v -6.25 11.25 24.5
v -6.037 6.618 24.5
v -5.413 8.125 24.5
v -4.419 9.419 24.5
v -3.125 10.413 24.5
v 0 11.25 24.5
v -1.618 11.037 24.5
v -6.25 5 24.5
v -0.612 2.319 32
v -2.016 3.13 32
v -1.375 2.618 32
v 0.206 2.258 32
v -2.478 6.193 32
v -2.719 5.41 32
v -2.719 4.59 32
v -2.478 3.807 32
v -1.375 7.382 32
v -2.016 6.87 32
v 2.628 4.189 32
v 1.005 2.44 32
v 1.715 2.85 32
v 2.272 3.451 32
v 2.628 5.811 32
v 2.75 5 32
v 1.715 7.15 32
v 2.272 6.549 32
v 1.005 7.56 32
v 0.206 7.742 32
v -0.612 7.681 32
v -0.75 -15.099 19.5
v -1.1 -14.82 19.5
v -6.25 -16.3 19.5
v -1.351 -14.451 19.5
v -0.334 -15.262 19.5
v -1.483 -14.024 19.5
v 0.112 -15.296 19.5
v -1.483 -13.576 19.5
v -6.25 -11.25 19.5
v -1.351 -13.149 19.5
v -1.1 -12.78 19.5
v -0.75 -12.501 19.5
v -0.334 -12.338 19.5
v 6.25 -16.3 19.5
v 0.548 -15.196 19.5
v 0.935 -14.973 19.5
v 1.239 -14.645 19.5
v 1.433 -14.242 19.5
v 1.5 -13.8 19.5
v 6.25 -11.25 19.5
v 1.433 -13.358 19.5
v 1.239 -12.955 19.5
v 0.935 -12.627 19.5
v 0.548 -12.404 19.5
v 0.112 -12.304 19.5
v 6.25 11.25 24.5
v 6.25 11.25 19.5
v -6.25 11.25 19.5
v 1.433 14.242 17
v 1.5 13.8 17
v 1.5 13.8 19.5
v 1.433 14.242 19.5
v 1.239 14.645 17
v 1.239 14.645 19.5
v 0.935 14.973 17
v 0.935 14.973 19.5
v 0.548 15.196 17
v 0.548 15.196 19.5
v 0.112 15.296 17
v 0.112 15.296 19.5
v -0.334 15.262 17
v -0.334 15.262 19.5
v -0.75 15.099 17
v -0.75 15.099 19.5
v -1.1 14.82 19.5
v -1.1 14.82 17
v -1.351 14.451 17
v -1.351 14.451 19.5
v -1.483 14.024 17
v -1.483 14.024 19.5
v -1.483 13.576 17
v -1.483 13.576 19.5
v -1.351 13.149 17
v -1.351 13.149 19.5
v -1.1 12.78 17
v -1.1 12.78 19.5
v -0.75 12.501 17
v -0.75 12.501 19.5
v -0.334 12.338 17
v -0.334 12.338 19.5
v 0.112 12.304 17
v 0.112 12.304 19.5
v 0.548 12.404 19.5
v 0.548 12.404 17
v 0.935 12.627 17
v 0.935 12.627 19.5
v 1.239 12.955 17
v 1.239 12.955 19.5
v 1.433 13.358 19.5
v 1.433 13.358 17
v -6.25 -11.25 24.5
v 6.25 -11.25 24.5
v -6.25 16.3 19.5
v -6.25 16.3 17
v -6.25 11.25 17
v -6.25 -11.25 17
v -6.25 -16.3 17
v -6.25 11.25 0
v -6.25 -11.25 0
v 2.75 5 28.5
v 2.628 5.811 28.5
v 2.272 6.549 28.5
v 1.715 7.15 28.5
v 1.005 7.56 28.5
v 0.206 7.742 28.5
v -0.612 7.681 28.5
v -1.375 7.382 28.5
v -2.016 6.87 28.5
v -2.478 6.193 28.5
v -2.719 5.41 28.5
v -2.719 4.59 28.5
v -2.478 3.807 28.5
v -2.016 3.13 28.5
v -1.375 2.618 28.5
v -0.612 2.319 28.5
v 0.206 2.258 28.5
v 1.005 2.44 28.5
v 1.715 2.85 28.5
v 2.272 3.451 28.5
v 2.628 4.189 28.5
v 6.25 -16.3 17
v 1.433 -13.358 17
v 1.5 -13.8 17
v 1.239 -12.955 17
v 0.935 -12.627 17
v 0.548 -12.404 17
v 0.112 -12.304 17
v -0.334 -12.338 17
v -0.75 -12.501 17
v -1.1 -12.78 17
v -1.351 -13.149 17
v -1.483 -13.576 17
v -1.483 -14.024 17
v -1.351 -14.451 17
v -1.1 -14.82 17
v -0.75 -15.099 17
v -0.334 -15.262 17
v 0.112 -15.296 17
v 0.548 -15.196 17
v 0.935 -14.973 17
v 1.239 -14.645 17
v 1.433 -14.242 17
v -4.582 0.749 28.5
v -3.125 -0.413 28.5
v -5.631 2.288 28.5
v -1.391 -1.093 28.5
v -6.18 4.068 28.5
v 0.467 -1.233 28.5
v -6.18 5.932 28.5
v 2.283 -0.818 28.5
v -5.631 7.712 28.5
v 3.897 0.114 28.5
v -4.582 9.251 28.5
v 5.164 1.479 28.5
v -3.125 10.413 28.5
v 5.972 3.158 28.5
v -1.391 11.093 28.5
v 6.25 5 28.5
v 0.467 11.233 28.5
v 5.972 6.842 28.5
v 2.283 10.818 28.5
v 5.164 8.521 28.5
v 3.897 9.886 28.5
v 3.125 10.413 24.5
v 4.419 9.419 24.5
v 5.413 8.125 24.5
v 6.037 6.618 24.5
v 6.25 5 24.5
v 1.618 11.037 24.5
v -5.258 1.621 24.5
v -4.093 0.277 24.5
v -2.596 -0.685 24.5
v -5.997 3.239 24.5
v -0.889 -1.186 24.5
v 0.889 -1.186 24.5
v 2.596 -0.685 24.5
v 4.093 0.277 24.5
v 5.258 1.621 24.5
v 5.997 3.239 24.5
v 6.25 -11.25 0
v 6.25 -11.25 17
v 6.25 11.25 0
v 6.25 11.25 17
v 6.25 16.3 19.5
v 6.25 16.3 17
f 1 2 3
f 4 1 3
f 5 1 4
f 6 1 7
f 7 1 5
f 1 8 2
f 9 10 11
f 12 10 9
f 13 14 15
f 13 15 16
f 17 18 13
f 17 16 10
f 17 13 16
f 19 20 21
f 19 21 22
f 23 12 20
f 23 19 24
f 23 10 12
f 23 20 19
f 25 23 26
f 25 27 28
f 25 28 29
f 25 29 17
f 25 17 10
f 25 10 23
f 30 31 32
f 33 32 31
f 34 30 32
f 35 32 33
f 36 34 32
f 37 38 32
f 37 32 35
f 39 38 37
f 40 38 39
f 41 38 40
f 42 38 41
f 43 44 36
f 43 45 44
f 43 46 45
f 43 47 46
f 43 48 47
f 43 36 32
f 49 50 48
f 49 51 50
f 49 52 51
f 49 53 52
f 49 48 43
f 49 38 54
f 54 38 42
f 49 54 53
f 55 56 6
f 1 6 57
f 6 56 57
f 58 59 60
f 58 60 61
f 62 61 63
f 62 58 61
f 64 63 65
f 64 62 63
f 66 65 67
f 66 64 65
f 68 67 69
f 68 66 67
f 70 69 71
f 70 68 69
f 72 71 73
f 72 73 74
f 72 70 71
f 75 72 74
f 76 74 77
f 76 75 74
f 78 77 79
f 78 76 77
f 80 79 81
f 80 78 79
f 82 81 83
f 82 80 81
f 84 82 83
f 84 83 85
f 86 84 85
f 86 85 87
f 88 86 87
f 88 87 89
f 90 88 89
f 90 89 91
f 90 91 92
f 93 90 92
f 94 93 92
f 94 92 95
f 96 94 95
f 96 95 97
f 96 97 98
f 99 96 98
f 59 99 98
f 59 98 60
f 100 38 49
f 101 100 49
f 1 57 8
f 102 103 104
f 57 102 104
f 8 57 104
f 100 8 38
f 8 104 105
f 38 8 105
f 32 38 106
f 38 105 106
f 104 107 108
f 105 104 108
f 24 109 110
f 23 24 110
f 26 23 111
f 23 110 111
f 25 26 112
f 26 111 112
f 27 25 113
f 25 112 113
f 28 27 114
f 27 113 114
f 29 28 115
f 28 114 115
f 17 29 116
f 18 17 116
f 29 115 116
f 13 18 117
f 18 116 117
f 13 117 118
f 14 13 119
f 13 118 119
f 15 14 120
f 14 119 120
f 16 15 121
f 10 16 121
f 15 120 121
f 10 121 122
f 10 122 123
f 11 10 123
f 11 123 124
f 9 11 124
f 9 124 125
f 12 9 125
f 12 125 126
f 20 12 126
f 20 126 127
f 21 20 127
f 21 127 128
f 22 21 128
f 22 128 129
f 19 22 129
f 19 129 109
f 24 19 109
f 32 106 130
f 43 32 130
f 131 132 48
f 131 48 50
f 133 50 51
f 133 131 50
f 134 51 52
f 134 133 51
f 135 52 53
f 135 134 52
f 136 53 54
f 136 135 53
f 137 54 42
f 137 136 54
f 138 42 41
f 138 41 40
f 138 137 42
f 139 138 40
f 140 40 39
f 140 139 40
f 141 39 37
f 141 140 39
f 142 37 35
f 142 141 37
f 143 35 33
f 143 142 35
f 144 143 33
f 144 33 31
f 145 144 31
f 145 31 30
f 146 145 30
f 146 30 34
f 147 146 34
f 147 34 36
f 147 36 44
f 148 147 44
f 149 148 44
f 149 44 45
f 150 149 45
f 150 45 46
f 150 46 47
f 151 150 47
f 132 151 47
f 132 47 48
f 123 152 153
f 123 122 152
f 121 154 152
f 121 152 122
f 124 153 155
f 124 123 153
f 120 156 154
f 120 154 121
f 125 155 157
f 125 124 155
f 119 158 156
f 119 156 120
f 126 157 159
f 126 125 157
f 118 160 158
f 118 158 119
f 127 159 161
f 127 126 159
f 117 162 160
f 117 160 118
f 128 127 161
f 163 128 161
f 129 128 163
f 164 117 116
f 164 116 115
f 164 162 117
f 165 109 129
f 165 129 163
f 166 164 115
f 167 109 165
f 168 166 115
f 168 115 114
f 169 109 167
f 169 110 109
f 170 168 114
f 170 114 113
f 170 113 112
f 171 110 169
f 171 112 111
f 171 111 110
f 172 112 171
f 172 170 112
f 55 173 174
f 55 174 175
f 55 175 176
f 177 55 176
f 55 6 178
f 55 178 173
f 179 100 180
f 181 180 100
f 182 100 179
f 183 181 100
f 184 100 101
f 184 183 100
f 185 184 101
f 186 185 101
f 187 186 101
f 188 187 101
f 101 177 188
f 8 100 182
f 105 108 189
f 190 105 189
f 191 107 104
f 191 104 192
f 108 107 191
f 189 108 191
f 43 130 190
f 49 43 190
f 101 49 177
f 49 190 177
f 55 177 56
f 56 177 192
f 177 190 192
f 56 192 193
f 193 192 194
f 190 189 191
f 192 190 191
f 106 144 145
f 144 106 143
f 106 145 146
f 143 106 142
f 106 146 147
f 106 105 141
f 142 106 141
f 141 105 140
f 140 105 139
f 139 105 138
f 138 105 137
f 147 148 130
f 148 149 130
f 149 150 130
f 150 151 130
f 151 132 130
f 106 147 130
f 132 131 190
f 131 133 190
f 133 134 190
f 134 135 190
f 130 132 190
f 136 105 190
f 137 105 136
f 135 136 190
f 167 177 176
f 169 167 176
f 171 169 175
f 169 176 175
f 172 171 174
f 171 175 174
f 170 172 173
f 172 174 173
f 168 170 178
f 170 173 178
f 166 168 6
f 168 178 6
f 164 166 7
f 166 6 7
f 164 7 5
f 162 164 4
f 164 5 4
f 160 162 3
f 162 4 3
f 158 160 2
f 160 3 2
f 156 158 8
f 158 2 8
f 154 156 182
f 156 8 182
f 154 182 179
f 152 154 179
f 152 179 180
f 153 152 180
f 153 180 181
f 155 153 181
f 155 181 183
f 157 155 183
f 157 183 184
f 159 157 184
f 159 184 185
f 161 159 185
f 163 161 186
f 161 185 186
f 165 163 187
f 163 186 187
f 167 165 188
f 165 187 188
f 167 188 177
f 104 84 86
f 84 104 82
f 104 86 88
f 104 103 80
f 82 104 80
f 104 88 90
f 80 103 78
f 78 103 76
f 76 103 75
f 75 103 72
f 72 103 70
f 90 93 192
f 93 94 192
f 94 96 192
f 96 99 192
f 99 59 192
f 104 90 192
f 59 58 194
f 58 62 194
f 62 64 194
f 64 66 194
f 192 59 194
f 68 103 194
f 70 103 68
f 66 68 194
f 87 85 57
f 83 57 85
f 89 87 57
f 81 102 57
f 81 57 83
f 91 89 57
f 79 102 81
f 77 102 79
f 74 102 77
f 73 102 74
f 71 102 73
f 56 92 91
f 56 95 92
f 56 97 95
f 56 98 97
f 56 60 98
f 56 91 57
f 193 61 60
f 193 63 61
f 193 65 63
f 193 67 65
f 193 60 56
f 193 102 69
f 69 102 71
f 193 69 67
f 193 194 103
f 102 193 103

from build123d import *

# Parameters (mm, degrees)
SKETCH_1_W          = 12.5
SKETCH_1_H          = 22.5
EXTRUDE_1_DEPTH     = 24.5
SKETCH_1_3_W        = 12.5
SKETCH_1_3_H        = 5.05
SKETCH_1_3_R        = 1.5
EXTRUDE_2_DEPTH     = 19.5
SKETCH_1_4_W        = 12.5
SKETCH_1_4_H        = 5.05
SKETCH_1_4_R        = 1.5
CUT_EXTRUDE_1_DEPTH = 17
SKETCH_1_5_R        = 6.25
EXTRUDE_3_DEPTH     = 28.5
SKETCH_1_6_R        = 2.75
EXTRUDE_4_DEPTH     = 32


with BuildPart() as part:
    # 草图1 → 凸台-拉伸1 (new body)
    with BuildSketch(Plane.XY):
        Rectangle(SKETCH_1_W, SKETCH_1_H)
    extrude(amount=EXTRUDE_1_DEPTH)

    # 草图1<3> → 凸台-拉伸2 (add)
    # profile 1 of 2: a face of its own
    with BuildSketch(Plane.XY):
        with Locations((0, -13.775)):
            Rectangle(SKETCH_1_3_W, SKETCH_1_3_H)
        with Locations((0, -13.8)):
            Circle(SKETCH_1_3_R, mode=Mode.SUBTRACT)
    # profile 2 of 2: a face of its own
    with BuildSketch(Plane.XY):
        with Locations((0, 13.775)):
            Rectangle(SKETCH_1_3_W, SKETCH_1_3_H)
        with Locations((0, 13.8)):
            Circle(SKETCH_1_3_R, mode=Mode.SUBTRACT)
    extrude(amount=EXTRUDE_2_DEPTH)

    # 草图1<4> → 切除-拉伸1 (cut)
    # profile 1 of 2: a face of its own
    with BuildSketch(Plane.XY):
        with Locations((0, -13.775)):
            Rectangle(SKETCH_1_4_W, SKETCH_1_4_H)
        with Locations((0, -13.8)):
            Circle(SKETCH_1_4_R, mode=Mode.SUBTRACT)
    # profile 2 of 2: a face of its own
    with BuildSketch(Plane.XY):
        with Locations((0, 13.775)):
            Rectangle(SKETCH_1_4_W, SKETCH_1_4_H)
        with Locations((0, 13.8)):
            Circle(SKETCH_1_4_R, mode=Mode.SUBTRACT)
    extrude(amount=CUT_EXTRUDE_1_DEPTH, mode=Mode.SUBTRACT)

    # 草图1<5> → 凸台-拉伸3 (add)
    with BuildSketch(Plane.XY):
        with Locations((0, 5)):
            Circle(SKETCH_1_5_R)
    extrude(amount=EXTRUDE_3_DEPTH)

    # 草图1<6> → 凸台-拉伸4 (add)
    with BuildSketch(Plane.XY):
        with Locations((0, 5)):
            Circle(SKETCH_1_6_R)
    extrude(amount=EXTRUDE_4_DEPTH)


solid = part.part
